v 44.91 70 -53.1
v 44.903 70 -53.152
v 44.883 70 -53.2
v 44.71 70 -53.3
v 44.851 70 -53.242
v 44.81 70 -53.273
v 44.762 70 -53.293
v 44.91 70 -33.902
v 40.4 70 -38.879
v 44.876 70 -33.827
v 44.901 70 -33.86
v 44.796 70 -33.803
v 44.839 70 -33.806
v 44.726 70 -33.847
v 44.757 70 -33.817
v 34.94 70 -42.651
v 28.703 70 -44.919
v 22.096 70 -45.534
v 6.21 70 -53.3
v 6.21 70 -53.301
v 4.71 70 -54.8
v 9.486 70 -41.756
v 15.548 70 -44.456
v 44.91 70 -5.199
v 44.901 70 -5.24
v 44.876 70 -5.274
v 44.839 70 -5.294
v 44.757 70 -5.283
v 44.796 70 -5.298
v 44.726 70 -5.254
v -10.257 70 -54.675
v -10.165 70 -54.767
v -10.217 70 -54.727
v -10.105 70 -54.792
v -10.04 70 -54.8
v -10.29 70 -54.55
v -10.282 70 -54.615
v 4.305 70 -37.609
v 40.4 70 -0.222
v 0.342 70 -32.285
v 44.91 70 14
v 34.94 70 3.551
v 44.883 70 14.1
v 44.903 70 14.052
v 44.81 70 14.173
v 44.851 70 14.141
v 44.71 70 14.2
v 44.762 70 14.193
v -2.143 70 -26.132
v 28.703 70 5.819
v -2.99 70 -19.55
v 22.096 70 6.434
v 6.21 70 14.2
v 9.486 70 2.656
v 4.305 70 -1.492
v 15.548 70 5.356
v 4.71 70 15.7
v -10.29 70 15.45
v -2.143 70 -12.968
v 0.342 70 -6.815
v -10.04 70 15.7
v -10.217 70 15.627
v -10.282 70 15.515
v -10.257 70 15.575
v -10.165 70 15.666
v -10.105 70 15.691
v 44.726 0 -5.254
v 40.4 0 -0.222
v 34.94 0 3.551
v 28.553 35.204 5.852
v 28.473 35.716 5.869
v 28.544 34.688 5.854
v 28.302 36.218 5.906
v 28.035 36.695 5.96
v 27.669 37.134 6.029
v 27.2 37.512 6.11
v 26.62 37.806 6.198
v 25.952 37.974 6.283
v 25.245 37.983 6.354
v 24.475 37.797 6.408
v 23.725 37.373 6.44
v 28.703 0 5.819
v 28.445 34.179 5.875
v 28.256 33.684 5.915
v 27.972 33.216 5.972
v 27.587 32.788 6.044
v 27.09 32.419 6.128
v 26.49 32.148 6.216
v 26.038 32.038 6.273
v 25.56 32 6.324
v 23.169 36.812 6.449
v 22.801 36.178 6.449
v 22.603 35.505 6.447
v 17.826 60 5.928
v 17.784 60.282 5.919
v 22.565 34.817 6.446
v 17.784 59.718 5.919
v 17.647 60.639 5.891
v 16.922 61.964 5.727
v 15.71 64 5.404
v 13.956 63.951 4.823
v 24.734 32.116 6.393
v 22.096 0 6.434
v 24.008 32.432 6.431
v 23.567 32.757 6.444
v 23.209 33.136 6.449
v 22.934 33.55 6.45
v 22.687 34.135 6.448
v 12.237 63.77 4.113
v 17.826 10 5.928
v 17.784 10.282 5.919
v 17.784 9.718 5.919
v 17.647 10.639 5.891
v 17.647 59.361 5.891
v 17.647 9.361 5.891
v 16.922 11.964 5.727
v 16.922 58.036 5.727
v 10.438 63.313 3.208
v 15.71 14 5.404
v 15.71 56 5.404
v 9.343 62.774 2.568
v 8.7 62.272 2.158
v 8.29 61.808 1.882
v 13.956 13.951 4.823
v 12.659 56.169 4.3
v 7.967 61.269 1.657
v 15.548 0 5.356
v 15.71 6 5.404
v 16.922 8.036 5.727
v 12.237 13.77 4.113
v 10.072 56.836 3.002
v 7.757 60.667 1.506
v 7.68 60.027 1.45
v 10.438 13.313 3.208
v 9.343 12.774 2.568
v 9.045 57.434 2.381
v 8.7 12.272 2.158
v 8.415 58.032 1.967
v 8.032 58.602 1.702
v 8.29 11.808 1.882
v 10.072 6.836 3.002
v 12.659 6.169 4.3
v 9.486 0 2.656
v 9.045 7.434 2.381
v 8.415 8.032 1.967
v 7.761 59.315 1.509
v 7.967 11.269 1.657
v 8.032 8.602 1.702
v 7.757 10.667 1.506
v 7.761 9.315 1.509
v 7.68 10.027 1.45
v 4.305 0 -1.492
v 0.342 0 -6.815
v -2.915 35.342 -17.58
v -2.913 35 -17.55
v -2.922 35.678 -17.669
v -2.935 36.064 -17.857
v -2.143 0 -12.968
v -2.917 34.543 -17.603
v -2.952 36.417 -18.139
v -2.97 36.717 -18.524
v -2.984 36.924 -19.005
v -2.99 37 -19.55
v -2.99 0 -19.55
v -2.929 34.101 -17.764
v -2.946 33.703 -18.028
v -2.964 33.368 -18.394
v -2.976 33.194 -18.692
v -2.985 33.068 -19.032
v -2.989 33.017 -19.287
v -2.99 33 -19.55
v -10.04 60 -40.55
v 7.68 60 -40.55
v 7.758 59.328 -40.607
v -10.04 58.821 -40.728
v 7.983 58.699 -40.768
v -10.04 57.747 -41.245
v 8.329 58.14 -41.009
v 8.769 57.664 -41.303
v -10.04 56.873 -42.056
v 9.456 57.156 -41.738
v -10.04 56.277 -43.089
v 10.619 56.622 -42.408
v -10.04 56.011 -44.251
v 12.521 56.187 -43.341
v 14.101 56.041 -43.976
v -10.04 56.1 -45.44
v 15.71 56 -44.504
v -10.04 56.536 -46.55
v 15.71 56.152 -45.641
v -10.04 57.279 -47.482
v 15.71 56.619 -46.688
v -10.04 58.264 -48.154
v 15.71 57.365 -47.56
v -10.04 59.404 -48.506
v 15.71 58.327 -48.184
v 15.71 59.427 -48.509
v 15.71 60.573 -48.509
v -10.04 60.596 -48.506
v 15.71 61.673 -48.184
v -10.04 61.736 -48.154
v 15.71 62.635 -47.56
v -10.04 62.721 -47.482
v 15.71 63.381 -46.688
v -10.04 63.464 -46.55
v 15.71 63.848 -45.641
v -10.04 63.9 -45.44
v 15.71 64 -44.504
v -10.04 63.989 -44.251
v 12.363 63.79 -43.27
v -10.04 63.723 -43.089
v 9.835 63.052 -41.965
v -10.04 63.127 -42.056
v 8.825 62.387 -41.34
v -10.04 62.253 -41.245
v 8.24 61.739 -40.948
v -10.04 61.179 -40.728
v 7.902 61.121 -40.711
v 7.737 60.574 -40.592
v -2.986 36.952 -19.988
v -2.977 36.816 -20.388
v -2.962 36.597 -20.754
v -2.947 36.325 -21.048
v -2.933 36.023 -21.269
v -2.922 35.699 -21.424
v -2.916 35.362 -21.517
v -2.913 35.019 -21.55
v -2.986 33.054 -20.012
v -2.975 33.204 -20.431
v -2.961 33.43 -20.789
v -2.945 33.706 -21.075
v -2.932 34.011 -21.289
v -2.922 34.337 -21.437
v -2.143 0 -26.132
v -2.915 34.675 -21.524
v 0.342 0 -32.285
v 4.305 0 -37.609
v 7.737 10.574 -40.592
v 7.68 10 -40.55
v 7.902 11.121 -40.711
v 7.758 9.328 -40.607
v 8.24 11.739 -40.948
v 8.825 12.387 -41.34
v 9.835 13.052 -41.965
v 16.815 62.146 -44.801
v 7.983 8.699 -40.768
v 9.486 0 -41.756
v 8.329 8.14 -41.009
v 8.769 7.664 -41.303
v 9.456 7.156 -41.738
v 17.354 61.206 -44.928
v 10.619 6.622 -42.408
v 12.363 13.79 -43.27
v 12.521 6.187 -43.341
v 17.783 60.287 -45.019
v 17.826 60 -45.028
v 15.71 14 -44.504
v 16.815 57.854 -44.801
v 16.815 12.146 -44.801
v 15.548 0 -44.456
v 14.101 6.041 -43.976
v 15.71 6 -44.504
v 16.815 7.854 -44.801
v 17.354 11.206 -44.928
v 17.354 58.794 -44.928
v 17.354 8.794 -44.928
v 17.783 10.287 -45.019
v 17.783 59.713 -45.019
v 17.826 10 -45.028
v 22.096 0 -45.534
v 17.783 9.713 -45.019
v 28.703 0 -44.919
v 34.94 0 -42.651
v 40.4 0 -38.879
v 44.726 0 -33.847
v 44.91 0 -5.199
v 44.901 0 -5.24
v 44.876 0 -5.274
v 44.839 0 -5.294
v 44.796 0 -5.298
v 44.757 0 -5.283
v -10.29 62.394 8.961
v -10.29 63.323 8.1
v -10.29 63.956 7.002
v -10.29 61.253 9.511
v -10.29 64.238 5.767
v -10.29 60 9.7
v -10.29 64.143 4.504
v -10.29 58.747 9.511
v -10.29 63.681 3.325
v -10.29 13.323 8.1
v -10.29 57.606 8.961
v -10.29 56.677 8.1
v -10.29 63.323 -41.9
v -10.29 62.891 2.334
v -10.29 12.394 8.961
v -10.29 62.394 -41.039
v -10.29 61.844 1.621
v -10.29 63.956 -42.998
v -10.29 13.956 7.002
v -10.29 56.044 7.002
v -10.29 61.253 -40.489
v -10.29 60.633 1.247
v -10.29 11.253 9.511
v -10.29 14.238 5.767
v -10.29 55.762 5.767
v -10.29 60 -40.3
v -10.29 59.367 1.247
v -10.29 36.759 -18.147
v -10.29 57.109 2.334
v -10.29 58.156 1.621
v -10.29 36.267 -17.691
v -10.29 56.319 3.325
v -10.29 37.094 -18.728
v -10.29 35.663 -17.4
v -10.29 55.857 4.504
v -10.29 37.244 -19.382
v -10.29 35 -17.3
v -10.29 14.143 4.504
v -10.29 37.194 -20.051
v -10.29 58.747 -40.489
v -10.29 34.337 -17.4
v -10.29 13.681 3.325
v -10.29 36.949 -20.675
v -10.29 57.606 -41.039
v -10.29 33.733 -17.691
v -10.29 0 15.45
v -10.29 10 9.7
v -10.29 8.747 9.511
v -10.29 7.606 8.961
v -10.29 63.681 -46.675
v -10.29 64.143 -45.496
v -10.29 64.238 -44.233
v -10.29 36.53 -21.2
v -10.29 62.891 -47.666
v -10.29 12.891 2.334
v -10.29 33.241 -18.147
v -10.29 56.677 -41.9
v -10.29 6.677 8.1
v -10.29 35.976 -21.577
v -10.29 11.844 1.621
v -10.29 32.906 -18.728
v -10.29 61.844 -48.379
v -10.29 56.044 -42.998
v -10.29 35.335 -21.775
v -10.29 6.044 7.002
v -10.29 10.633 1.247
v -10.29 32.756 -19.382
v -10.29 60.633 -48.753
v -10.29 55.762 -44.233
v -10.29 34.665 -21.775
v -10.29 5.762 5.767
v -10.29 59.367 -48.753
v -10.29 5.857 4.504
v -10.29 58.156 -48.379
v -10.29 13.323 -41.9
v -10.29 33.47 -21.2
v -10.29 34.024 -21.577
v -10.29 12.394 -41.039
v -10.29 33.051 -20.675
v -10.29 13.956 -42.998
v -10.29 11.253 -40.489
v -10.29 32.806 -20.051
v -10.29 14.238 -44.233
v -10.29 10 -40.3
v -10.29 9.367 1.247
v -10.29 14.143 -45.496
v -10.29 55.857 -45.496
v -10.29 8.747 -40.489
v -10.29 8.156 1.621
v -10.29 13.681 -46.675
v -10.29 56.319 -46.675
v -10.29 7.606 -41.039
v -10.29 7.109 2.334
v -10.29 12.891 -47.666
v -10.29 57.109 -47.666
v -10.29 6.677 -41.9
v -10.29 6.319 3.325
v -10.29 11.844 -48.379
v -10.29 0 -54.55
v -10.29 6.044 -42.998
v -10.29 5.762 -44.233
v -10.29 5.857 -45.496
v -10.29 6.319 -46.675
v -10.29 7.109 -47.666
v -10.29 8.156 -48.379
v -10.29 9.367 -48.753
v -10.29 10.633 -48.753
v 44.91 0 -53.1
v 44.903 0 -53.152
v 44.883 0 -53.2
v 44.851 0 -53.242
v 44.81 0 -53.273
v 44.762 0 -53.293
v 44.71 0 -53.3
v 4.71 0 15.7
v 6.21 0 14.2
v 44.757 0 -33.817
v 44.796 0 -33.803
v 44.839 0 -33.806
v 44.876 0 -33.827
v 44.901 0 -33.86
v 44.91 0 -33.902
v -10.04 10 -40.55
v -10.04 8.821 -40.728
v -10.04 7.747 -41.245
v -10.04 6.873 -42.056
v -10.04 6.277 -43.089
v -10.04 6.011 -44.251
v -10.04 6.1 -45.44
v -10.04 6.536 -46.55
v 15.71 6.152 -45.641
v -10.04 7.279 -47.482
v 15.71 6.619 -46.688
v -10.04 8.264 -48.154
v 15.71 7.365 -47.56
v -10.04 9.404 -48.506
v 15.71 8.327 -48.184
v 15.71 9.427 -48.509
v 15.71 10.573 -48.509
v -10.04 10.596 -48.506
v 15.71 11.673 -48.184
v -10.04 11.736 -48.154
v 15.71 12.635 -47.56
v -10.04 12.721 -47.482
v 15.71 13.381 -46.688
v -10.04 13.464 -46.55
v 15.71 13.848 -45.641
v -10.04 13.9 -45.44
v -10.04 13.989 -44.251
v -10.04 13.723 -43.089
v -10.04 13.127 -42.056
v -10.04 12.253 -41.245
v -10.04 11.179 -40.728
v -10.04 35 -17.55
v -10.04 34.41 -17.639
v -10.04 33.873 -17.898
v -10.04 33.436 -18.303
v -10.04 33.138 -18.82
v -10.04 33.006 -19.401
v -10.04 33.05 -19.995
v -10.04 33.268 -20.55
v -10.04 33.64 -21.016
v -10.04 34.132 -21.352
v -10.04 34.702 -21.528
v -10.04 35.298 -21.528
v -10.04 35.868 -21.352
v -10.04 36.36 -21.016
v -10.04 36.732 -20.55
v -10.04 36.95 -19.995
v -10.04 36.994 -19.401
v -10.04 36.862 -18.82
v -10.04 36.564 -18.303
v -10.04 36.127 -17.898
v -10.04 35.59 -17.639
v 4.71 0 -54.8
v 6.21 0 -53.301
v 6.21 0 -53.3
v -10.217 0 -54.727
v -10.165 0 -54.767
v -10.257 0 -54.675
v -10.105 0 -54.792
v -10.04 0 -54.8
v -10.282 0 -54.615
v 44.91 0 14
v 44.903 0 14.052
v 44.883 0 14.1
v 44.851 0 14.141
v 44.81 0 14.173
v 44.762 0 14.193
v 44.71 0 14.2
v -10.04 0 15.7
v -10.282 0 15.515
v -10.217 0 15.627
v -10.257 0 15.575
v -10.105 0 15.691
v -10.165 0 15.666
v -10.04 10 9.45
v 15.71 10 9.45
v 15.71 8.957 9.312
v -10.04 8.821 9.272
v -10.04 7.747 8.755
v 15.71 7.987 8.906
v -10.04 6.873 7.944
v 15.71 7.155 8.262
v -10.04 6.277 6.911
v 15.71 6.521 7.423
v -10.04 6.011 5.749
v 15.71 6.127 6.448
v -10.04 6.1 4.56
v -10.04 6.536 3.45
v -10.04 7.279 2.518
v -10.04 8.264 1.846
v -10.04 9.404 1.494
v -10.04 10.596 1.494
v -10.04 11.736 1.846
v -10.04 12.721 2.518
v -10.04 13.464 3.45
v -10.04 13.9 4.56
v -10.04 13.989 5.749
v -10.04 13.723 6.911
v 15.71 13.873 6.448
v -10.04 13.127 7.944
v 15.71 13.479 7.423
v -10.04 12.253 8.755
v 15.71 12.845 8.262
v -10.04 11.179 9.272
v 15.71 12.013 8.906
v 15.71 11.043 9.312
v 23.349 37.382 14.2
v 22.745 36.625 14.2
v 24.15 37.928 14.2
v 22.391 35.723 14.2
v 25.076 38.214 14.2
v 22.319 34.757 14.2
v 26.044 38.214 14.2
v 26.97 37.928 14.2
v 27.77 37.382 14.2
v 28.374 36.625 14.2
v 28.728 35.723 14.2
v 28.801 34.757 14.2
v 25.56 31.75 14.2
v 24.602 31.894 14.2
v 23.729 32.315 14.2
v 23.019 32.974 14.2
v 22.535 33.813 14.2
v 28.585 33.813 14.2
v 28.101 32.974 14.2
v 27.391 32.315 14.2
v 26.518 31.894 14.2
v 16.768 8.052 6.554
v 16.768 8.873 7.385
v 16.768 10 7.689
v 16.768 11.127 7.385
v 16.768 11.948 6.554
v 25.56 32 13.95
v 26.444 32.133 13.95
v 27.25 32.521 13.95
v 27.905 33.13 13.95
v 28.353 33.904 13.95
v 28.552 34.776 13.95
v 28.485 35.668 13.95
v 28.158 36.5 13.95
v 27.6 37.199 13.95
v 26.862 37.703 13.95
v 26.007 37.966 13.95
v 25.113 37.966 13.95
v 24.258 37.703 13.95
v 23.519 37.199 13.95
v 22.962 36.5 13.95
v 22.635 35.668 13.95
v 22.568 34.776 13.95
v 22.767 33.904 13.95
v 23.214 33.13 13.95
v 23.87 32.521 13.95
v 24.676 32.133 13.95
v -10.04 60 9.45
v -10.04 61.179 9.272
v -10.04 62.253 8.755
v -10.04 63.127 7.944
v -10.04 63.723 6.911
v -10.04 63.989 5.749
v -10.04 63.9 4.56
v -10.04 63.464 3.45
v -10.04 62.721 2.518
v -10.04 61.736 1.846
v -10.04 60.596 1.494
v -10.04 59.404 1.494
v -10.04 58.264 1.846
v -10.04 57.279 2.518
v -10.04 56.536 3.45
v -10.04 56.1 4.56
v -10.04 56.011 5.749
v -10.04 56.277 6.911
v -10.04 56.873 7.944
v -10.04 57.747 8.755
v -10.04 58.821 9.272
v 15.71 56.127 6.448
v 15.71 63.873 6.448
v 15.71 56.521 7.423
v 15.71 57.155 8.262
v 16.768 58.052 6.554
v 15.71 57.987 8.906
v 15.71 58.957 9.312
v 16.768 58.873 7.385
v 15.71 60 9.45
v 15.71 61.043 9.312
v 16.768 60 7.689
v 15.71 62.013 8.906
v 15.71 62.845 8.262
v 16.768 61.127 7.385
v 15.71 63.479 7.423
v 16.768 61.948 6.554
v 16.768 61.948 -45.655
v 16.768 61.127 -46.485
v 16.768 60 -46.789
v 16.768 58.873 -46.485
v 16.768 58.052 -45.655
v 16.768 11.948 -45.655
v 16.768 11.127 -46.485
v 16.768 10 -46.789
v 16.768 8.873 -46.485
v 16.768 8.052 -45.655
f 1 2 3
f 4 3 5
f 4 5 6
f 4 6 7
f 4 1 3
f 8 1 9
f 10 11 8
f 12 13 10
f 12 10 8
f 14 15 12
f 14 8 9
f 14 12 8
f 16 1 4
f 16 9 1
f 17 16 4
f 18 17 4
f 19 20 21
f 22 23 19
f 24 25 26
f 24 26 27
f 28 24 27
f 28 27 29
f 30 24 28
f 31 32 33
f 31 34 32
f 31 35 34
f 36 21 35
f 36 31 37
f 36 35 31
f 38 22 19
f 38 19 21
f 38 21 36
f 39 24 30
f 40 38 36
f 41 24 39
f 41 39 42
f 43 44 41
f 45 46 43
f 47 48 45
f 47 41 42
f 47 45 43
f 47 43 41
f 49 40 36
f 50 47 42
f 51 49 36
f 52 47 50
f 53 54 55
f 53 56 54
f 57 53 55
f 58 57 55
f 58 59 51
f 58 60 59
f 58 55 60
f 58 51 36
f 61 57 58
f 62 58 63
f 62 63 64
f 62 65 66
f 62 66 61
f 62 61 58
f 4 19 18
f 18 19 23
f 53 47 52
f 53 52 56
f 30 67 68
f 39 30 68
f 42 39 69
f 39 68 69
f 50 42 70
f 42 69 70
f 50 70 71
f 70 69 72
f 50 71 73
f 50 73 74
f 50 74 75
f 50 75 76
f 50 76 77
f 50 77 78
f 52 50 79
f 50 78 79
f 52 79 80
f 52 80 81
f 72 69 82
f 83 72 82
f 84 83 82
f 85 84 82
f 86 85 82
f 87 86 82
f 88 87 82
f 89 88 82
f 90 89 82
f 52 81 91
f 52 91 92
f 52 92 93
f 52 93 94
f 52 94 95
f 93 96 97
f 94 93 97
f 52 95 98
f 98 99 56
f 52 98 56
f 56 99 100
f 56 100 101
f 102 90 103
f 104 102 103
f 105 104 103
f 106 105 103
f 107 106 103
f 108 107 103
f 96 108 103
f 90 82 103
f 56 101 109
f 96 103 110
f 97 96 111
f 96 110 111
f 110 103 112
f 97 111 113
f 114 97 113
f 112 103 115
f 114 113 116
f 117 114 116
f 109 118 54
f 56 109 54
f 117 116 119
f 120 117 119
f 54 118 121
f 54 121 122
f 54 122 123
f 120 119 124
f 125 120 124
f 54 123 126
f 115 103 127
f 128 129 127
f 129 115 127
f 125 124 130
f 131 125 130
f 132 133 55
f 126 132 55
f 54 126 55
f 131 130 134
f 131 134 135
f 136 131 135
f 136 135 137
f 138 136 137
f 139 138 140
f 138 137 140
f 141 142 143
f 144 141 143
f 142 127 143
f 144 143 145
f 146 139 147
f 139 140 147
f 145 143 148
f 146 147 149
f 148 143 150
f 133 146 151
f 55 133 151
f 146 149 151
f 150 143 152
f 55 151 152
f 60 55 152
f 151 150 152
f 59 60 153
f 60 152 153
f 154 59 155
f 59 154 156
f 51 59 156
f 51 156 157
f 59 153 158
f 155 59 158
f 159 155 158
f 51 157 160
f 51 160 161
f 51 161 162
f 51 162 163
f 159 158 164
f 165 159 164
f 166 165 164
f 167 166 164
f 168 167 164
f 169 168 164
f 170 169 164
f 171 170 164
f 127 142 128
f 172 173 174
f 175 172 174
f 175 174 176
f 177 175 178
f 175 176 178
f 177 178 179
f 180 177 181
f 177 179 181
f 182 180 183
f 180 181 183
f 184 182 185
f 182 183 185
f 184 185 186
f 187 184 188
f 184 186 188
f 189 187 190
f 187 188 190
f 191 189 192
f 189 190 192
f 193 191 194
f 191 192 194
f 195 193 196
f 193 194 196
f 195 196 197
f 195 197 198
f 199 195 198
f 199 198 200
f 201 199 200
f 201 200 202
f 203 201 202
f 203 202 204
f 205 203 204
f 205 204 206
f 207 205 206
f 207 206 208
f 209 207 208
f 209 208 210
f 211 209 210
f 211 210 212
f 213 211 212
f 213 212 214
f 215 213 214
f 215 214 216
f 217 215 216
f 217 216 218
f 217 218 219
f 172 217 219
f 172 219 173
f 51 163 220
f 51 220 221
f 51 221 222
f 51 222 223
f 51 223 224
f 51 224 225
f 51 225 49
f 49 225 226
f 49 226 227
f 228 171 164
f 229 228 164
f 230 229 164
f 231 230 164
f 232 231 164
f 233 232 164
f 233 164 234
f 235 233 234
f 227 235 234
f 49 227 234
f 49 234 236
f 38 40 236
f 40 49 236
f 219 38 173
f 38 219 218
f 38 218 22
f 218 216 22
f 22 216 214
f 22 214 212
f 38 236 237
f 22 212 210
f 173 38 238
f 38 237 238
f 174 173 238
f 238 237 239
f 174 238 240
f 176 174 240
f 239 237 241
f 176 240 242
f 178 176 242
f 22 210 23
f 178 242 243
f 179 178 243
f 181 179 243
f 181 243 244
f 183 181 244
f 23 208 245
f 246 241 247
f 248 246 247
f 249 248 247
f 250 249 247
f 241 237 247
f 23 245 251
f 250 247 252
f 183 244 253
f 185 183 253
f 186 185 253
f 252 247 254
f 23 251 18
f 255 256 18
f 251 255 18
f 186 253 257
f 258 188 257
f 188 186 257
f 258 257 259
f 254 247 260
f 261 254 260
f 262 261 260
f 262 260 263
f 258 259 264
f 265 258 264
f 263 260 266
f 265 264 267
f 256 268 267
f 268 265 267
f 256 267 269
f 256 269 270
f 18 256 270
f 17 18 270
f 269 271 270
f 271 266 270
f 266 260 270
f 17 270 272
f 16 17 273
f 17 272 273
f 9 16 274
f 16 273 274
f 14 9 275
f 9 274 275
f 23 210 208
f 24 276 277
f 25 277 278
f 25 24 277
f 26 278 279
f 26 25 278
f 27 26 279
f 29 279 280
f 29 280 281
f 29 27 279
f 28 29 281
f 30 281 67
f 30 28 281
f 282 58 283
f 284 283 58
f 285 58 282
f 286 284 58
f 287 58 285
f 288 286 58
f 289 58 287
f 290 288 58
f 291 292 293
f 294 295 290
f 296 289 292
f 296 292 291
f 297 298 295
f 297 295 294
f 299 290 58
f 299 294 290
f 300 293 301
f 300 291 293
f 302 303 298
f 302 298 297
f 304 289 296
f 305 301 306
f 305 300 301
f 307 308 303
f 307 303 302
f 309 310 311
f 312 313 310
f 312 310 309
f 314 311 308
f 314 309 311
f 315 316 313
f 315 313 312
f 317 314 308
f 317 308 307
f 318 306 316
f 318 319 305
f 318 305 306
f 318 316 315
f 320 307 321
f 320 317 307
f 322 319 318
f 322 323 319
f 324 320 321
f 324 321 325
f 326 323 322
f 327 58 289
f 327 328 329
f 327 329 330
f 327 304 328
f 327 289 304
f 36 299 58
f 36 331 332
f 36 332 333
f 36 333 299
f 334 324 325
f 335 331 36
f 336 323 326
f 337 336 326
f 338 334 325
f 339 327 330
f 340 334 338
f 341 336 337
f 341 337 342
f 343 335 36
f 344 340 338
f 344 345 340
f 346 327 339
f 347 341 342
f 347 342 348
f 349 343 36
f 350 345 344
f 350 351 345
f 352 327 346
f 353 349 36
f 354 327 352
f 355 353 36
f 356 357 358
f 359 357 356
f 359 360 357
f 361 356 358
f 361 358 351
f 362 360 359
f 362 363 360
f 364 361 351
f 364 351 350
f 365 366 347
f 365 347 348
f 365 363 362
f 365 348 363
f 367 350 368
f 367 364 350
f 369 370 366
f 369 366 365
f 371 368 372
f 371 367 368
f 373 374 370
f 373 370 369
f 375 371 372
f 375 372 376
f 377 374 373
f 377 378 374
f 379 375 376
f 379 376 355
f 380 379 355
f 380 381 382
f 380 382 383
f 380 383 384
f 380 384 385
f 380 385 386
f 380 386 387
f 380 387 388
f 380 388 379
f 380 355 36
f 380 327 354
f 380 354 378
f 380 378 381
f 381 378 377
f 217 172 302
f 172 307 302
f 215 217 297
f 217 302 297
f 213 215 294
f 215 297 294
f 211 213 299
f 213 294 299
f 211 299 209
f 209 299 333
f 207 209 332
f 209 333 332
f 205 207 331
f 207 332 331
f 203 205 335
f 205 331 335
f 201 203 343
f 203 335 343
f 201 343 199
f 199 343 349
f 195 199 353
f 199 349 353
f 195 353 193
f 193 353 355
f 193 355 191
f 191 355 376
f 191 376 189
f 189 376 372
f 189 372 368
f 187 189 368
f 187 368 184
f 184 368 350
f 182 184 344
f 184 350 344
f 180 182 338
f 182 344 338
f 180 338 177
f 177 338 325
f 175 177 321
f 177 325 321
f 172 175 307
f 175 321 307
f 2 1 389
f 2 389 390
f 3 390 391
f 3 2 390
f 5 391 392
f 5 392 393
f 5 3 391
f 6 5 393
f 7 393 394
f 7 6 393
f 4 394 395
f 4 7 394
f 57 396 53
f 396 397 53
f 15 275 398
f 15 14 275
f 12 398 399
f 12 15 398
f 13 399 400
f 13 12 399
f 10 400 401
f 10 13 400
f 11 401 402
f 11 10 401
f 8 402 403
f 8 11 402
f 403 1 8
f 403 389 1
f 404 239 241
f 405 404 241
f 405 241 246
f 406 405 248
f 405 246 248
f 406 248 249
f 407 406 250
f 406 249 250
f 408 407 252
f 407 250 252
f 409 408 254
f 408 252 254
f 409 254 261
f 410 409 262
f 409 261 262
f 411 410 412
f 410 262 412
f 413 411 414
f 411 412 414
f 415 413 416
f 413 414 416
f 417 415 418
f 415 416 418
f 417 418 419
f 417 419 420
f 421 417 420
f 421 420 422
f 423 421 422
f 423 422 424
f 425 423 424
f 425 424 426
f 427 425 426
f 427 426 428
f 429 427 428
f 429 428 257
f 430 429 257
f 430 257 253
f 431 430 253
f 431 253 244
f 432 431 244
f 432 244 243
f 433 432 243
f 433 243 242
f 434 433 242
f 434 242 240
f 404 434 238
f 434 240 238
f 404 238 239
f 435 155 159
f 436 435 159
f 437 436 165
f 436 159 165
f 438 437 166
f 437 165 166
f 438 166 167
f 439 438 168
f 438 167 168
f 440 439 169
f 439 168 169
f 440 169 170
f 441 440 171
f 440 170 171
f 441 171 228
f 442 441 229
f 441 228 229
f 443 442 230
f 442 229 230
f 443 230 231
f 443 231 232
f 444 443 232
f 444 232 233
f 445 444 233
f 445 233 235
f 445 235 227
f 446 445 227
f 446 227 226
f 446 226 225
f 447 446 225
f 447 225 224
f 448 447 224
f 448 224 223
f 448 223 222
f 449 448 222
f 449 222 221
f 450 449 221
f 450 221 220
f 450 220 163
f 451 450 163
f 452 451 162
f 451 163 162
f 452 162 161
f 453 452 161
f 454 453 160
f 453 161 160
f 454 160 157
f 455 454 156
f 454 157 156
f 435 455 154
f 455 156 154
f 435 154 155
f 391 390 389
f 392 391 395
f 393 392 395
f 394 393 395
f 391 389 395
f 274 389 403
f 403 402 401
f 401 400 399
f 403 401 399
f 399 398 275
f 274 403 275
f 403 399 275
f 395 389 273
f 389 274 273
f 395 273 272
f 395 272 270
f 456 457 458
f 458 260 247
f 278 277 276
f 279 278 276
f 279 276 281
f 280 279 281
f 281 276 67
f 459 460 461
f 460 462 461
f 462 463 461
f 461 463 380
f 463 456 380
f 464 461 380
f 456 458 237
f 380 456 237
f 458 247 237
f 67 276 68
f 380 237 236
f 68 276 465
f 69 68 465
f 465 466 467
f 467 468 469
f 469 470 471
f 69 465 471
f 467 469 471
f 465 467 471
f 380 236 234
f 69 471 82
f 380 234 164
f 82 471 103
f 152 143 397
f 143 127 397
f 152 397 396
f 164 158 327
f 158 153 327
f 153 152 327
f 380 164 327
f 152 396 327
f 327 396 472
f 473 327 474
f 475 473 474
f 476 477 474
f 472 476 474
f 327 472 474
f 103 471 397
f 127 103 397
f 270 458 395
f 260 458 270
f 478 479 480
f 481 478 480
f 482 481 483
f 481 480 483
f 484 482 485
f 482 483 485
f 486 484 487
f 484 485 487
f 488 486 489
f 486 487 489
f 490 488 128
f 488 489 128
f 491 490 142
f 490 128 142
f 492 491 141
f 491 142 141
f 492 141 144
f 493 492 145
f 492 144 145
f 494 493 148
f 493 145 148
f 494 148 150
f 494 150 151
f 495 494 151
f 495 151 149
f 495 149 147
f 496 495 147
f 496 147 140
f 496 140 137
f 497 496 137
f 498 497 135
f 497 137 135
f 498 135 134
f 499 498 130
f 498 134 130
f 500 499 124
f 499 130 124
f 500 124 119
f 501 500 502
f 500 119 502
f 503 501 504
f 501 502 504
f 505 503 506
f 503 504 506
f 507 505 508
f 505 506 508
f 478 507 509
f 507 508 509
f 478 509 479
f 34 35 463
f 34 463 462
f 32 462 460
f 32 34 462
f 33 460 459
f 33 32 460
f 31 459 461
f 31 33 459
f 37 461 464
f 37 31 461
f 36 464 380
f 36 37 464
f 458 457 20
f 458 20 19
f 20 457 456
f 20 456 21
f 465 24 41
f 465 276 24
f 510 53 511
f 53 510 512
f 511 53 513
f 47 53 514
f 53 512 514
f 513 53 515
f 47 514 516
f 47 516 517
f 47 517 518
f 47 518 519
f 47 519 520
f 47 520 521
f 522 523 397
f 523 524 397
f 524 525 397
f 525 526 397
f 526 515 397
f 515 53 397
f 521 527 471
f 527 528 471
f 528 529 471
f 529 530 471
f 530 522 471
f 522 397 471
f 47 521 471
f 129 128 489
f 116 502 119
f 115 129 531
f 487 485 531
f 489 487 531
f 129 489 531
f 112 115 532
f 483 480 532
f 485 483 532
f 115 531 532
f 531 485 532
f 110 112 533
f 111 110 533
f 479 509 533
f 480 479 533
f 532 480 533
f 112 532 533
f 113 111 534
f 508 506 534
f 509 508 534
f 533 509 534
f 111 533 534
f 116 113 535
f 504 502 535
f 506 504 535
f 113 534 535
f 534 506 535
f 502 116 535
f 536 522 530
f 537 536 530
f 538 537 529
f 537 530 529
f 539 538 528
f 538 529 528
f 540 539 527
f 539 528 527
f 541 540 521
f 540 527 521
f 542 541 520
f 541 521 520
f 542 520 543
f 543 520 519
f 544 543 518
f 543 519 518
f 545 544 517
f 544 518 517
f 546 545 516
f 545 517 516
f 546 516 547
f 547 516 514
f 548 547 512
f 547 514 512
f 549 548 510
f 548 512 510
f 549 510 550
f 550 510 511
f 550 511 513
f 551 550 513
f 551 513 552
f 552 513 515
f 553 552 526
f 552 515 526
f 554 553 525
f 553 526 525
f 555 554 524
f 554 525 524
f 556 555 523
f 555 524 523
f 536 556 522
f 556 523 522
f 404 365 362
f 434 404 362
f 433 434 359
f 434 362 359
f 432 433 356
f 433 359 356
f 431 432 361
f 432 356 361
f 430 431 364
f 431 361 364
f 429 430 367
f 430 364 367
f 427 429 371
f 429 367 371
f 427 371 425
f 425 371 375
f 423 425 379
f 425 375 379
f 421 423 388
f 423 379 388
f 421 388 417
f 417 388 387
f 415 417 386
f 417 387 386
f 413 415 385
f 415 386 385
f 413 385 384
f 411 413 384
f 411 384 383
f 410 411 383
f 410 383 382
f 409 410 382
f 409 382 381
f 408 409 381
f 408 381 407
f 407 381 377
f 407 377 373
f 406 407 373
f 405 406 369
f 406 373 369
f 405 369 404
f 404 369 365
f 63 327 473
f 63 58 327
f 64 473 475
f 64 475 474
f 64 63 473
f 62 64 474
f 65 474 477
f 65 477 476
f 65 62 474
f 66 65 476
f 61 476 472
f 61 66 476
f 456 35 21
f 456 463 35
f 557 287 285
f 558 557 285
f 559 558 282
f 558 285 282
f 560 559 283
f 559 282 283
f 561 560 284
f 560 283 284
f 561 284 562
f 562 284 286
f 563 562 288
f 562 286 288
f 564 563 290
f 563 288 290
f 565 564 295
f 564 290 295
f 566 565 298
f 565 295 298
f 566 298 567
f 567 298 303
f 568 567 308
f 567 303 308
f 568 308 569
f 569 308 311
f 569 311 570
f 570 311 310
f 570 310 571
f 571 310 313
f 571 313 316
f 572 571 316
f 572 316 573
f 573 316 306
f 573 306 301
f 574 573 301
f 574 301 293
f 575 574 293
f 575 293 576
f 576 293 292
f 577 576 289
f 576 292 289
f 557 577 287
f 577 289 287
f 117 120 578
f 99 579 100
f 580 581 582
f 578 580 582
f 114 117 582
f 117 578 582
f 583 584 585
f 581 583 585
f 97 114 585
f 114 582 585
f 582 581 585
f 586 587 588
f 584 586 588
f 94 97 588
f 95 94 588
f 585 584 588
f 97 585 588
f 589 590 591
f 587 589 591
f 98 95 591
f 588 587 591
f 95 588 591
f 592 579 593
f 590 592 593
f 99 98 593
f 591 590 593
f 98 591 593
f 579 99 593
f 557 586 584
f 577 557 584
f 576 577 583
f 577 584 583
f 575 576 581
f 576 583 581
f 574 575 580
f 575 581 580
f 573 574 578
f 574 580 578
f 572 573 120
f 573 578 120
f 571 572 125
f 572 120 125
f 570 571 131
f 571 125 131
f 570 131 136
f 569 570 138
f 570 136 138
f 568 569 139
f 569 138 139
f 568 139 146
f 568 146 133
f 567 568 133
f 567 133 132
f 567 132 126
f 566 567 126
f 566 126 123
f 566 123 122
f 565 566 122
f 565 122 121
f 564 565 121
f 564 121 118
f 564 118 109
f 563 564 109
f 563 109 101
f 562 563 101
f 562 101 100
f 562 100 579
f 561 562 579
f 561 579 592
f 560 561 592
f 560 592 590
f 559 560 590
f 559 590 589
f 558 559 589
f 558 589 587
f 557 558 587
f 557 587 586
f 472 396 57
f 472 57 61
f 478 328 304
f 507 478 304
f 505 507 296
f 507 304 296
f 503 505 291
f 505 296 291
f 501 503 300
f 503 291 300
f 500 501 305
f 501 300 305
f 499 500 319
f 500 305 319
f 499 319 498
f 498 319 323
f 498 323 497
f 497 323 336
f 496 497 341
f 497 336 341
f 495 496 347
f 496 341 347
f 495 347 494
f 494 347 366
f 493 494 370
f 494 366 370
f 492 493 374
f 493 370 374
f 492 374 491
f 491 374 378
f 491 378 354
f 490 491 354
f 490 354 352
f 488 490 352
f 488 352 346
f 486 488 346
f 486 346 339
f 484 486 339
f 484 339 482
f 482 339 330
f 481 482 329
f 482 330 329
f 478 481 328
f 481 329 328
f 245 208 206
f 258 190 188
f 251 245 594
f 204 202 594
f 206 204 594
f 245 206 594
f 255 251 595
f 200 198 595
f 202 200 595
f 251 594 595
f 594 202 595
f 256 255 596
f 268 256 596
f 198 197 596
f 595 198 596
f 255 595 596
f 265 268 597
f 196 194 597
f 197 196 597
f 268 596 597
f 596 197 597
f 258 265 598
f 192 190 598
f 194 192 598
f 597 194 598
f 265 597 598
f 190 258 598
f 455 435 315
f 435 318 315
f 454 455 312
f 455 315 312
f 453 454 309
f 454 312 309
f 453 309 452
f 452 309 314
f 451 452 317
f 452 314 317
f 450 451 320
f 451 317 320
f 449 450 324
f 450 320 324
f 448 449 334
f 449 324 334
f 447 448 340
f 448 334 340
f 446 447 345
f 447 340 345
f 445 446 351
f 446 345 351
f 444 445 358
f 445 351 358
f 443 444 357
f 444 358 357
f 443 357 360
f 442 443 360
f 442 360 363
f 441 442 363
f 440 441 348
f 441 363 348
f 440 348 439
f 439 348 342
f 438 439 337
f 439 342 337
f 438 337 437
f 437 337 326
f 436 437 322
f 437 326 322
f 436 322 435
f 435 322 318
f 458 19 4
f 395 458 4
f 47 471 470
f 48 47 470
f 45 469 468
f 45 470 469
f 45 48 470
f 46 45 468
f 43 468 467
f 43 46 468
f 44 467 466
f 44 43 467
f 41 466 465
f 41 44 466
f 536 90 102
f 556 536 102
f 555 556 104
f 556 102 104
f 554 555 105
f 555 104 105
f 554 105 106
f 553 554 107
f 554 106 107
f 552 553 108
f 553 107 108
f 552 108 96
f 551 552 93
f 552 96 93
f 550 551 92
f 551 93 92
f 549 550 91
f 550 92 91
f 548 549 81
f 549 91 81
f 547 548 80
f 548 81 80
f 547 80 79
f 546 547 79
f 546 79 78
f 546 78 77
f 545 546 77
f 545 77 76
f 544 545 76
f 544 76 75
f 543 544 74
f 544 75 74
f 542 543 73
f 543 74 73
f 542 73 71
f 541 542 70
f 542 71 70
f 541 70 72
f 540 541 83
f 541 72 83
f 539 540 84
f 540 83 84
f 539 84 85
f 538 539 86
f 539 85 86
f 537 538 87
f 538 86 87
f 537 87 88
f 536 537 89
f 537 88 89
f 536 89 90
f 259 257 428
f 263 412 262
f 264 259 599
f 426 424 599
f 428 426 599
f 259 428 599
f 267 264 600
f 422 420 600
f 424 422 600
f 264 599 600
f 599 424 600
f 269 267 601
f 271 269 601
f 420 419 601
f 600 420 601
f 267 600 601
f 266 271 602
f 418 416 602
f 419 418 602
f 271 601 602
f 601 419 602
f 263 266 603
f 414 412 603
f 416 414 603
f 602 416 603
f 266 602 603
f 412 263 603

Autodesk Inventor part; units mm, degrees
ref_plane "YZ Plane" through (0, 0, 0) normal (1, 0, 0) x (0, 1, 0)
ref_plane "XZ Plane" through (0, 0, 0) normal (0, 1, 0) x (-1, 0, 0)
ref_plane "XY Plane" through (0, 0, 0) normal (0, 0, 1) x (1, 0, 0)
sketch "Boceto1" plane through (0, 0, 0) normal (0, 1, 0) x (-1, 0, 0)
  line L0 (10.2901, 15.6998) -> (10.2901, -54.8002)
  line L1 (10.2901, -54.8002) -> (-6.2099, -54.8002)
  line L2 (-44.9099, -53.3002) -> (-44.9099, 14.1998)
  line L3 (-6.2099, 15.6998) -> (10.2901, 15.6998)
  line L4 (10.2901, 15.6998) -> (-6.2099, 15.6998)
  line L5 (-6.2099, 15.6998) -> (-6.2099, 14.1998)
  line L6 (-6.2099, 14.1998) -> (-44.9099, 14.1998)
  line L7 (10.2901, -54.8002) -> (-6.2099, -54.8002)
  line L8 (-6.2099, -54.8002) -> (-6.2099, -53.3002)
  line L9 (-6.2099, -53.3002) -> (-44.9099, -53.3002)
  circle A0 centre (-23.0099, -19.5502) radius 26
  point P0 (0, 0)
  point P1 (-44.9099, -5.5363)
  point P2 (-44.9099, -33.5641)
  dimension "d0" = 70.5
  dimension "d3" = 16.5
  dimension "d4" = 1.5
  dimension "d5" = 1.5
  dimension "d6" = 55.2
  dimension "d7" = 67.5
  dimension "d8" = 52
  dimension "d9" = 33.3
  dimension "d10" = 33.75
extrude "Extrusión1" add sketch "Boceto1" along normal blind 70 contours L0 L1 L8 L9 L2 A0 L6 L5 L3
fillet "Empalme1" radius 0.25 2 edges at (-10.2901, 35, 15.6998) (-10.2901, 35, -54.8002)
chamfer "Chaflán1" distance 1.5 angle 45 1 edges at (6.2099, 35, 15.6998)
chamfer "Chaflán2" distance 1.5 angle 45 1 edges at (6.2099, 35, -54.8002)
sketch "Boceto2" plane through (-10.2901, 0, -54.5502) normal (-1, 0, 0) x (0, 0, 1)
  line L0 (9, 70) -> (61, 70) projected
  line L1 (35, 70) -> (35, 0)
  line L2 (0, 0) -> (70, 0) projected
  line L3 (35, 35) -> (-0.338, 35)
  line L4 (-0.338, 35) -> (70.438, 35)
  line L5 (35, 35) -> (59.975, 35)
  line L6 (35, 35) -> (10, 35)
  line L7 (10, 35) -> (10, 60)
  line L8 (10, 60) -> (60, 60)
  line L9 (60, 60) -> (60, 10)
  line L10 (60, 10) -> (10, 10)
  line L11 (10, 10) -> (10, 60)
  circle A0 centre (10, 60) radius 4
  circle A1 centre (60, 60) radius 4
  circle A2 centre (10, 10) radius 4
  circle A3 centre (60, 10) radius 4
  circle A4 centre (35, 35) radius 2
  point P0 (54.5502, 0)
  point P1 (49.0139, 70)
  point P2 (20.9861, 70)
  dimension "d23" = 25
  dimension "d24" = 50
  dimension "d25" = 50
  dimension "d26" = 8
  dimension "d27" = 8
  dimension "d28" = 8
  dimension "d29" = 8
  dimension "d30" = 4
  dimension "d73" = 25
hole "Agujero1" at (-10.2901, 60, -44.5502) at (-10.2901, 60, 5.4498) at (-10.2901, 10, -44.5502) at (-10.2901, 10, 5.4498) direction (1, 0, 0) diameter 8 depth 26 tip angle 118
thread "Rosca1" size "M8x1.25" class "6H" standard "ISO Metric profile" length 11.5
thread "Rosca2" size "M8x1.25" class "6H" standard "ISO Metric profile" length 11.5
thread "Rosca3" size "M8x1.25" class "6H" standard "ISO Metric profile" length 11.5
thread "Rosca4" size "M8x1.25" class "6H" standard "ISO Metric profile" length 11.5
hole "Agujero2" at (-10.2901, 35, -19.5502) direction (1, 0, 0) diameter 4 depth 26 tip angle 118
thread "Rosca5" size "M4x0.7" class "6H" standard "ISO Metric profile" length 11.5
chamfer "Chaflán3" distance 0.25 angle 45 5 edges at (-10.2901, 60, -48.5502) (-10.2901, 60, 1.4498) (-10.2901, 10, -48.5502) (-10.2901, 10, 1.4498) (-10.2901, 35, -21.5502)
sketch "Boceto3" plane through (44.9099, 0, 14.1998) normal (0, 0, 1) x (1, 0, 0)
  point P0 (-44.9099, 0)
sketch "Boceto4" plane through (44.9099, 0, 14.1998) normal (0, 0, 1) x (1, 0, 0)
  line L0 (-38.7, 0) -> (-38.7, 70) projected
  line L1 (-38.7, 0) -> (-38.7, 70)
  line L2 (-47.9, 70) -> (0, 70) projected
  line L3 (-38.7, 70) -> (0, 70)
  line L4 (0, 0) -> (0, 70) projected
  line L5 (0, 70) -> (0, 0)
  line L6 (0, 0) -> (-38.7, 0)
  line L7 (-47.9, 0) -> (0, 0) projected
  line L8 (-19.35, 0) -> (-19.35, 70)
  line L9 (-19.35, 35) -> (-14.4981, 35)
  line L10 (-14.4981, 35) -> (-25.37, 35)
  circle A0 centre (-19.35, 35) radius 3
  point P0 (-44.9099, 0)
  dimension "d58" = 6
hole "Agujero3" at (25.5599, 35, 14.1998) direction (0, 0, -1) diameter 6 depth 26 tip angle 118
thread "Rosca6" size "M6x1" class "6H" standard "ISO Metric profile" length 11.5
chamfer "Chaflán4" distance 0.25 angle 45 1 edges at (25.5599, 38, 14.1998)
fillet "Empalme2" radius 0.1 2 edges at (44.9099, 35, -5.5363) (44.9099, 35, -33.5641)
fillet "Empalme3" radius 0.2 2 edges at (44.9099, 35, -53.3002) (44.9099, 35, 14.1998)
properties part number "Soporte de Motor" material "Aluminio 6061"
